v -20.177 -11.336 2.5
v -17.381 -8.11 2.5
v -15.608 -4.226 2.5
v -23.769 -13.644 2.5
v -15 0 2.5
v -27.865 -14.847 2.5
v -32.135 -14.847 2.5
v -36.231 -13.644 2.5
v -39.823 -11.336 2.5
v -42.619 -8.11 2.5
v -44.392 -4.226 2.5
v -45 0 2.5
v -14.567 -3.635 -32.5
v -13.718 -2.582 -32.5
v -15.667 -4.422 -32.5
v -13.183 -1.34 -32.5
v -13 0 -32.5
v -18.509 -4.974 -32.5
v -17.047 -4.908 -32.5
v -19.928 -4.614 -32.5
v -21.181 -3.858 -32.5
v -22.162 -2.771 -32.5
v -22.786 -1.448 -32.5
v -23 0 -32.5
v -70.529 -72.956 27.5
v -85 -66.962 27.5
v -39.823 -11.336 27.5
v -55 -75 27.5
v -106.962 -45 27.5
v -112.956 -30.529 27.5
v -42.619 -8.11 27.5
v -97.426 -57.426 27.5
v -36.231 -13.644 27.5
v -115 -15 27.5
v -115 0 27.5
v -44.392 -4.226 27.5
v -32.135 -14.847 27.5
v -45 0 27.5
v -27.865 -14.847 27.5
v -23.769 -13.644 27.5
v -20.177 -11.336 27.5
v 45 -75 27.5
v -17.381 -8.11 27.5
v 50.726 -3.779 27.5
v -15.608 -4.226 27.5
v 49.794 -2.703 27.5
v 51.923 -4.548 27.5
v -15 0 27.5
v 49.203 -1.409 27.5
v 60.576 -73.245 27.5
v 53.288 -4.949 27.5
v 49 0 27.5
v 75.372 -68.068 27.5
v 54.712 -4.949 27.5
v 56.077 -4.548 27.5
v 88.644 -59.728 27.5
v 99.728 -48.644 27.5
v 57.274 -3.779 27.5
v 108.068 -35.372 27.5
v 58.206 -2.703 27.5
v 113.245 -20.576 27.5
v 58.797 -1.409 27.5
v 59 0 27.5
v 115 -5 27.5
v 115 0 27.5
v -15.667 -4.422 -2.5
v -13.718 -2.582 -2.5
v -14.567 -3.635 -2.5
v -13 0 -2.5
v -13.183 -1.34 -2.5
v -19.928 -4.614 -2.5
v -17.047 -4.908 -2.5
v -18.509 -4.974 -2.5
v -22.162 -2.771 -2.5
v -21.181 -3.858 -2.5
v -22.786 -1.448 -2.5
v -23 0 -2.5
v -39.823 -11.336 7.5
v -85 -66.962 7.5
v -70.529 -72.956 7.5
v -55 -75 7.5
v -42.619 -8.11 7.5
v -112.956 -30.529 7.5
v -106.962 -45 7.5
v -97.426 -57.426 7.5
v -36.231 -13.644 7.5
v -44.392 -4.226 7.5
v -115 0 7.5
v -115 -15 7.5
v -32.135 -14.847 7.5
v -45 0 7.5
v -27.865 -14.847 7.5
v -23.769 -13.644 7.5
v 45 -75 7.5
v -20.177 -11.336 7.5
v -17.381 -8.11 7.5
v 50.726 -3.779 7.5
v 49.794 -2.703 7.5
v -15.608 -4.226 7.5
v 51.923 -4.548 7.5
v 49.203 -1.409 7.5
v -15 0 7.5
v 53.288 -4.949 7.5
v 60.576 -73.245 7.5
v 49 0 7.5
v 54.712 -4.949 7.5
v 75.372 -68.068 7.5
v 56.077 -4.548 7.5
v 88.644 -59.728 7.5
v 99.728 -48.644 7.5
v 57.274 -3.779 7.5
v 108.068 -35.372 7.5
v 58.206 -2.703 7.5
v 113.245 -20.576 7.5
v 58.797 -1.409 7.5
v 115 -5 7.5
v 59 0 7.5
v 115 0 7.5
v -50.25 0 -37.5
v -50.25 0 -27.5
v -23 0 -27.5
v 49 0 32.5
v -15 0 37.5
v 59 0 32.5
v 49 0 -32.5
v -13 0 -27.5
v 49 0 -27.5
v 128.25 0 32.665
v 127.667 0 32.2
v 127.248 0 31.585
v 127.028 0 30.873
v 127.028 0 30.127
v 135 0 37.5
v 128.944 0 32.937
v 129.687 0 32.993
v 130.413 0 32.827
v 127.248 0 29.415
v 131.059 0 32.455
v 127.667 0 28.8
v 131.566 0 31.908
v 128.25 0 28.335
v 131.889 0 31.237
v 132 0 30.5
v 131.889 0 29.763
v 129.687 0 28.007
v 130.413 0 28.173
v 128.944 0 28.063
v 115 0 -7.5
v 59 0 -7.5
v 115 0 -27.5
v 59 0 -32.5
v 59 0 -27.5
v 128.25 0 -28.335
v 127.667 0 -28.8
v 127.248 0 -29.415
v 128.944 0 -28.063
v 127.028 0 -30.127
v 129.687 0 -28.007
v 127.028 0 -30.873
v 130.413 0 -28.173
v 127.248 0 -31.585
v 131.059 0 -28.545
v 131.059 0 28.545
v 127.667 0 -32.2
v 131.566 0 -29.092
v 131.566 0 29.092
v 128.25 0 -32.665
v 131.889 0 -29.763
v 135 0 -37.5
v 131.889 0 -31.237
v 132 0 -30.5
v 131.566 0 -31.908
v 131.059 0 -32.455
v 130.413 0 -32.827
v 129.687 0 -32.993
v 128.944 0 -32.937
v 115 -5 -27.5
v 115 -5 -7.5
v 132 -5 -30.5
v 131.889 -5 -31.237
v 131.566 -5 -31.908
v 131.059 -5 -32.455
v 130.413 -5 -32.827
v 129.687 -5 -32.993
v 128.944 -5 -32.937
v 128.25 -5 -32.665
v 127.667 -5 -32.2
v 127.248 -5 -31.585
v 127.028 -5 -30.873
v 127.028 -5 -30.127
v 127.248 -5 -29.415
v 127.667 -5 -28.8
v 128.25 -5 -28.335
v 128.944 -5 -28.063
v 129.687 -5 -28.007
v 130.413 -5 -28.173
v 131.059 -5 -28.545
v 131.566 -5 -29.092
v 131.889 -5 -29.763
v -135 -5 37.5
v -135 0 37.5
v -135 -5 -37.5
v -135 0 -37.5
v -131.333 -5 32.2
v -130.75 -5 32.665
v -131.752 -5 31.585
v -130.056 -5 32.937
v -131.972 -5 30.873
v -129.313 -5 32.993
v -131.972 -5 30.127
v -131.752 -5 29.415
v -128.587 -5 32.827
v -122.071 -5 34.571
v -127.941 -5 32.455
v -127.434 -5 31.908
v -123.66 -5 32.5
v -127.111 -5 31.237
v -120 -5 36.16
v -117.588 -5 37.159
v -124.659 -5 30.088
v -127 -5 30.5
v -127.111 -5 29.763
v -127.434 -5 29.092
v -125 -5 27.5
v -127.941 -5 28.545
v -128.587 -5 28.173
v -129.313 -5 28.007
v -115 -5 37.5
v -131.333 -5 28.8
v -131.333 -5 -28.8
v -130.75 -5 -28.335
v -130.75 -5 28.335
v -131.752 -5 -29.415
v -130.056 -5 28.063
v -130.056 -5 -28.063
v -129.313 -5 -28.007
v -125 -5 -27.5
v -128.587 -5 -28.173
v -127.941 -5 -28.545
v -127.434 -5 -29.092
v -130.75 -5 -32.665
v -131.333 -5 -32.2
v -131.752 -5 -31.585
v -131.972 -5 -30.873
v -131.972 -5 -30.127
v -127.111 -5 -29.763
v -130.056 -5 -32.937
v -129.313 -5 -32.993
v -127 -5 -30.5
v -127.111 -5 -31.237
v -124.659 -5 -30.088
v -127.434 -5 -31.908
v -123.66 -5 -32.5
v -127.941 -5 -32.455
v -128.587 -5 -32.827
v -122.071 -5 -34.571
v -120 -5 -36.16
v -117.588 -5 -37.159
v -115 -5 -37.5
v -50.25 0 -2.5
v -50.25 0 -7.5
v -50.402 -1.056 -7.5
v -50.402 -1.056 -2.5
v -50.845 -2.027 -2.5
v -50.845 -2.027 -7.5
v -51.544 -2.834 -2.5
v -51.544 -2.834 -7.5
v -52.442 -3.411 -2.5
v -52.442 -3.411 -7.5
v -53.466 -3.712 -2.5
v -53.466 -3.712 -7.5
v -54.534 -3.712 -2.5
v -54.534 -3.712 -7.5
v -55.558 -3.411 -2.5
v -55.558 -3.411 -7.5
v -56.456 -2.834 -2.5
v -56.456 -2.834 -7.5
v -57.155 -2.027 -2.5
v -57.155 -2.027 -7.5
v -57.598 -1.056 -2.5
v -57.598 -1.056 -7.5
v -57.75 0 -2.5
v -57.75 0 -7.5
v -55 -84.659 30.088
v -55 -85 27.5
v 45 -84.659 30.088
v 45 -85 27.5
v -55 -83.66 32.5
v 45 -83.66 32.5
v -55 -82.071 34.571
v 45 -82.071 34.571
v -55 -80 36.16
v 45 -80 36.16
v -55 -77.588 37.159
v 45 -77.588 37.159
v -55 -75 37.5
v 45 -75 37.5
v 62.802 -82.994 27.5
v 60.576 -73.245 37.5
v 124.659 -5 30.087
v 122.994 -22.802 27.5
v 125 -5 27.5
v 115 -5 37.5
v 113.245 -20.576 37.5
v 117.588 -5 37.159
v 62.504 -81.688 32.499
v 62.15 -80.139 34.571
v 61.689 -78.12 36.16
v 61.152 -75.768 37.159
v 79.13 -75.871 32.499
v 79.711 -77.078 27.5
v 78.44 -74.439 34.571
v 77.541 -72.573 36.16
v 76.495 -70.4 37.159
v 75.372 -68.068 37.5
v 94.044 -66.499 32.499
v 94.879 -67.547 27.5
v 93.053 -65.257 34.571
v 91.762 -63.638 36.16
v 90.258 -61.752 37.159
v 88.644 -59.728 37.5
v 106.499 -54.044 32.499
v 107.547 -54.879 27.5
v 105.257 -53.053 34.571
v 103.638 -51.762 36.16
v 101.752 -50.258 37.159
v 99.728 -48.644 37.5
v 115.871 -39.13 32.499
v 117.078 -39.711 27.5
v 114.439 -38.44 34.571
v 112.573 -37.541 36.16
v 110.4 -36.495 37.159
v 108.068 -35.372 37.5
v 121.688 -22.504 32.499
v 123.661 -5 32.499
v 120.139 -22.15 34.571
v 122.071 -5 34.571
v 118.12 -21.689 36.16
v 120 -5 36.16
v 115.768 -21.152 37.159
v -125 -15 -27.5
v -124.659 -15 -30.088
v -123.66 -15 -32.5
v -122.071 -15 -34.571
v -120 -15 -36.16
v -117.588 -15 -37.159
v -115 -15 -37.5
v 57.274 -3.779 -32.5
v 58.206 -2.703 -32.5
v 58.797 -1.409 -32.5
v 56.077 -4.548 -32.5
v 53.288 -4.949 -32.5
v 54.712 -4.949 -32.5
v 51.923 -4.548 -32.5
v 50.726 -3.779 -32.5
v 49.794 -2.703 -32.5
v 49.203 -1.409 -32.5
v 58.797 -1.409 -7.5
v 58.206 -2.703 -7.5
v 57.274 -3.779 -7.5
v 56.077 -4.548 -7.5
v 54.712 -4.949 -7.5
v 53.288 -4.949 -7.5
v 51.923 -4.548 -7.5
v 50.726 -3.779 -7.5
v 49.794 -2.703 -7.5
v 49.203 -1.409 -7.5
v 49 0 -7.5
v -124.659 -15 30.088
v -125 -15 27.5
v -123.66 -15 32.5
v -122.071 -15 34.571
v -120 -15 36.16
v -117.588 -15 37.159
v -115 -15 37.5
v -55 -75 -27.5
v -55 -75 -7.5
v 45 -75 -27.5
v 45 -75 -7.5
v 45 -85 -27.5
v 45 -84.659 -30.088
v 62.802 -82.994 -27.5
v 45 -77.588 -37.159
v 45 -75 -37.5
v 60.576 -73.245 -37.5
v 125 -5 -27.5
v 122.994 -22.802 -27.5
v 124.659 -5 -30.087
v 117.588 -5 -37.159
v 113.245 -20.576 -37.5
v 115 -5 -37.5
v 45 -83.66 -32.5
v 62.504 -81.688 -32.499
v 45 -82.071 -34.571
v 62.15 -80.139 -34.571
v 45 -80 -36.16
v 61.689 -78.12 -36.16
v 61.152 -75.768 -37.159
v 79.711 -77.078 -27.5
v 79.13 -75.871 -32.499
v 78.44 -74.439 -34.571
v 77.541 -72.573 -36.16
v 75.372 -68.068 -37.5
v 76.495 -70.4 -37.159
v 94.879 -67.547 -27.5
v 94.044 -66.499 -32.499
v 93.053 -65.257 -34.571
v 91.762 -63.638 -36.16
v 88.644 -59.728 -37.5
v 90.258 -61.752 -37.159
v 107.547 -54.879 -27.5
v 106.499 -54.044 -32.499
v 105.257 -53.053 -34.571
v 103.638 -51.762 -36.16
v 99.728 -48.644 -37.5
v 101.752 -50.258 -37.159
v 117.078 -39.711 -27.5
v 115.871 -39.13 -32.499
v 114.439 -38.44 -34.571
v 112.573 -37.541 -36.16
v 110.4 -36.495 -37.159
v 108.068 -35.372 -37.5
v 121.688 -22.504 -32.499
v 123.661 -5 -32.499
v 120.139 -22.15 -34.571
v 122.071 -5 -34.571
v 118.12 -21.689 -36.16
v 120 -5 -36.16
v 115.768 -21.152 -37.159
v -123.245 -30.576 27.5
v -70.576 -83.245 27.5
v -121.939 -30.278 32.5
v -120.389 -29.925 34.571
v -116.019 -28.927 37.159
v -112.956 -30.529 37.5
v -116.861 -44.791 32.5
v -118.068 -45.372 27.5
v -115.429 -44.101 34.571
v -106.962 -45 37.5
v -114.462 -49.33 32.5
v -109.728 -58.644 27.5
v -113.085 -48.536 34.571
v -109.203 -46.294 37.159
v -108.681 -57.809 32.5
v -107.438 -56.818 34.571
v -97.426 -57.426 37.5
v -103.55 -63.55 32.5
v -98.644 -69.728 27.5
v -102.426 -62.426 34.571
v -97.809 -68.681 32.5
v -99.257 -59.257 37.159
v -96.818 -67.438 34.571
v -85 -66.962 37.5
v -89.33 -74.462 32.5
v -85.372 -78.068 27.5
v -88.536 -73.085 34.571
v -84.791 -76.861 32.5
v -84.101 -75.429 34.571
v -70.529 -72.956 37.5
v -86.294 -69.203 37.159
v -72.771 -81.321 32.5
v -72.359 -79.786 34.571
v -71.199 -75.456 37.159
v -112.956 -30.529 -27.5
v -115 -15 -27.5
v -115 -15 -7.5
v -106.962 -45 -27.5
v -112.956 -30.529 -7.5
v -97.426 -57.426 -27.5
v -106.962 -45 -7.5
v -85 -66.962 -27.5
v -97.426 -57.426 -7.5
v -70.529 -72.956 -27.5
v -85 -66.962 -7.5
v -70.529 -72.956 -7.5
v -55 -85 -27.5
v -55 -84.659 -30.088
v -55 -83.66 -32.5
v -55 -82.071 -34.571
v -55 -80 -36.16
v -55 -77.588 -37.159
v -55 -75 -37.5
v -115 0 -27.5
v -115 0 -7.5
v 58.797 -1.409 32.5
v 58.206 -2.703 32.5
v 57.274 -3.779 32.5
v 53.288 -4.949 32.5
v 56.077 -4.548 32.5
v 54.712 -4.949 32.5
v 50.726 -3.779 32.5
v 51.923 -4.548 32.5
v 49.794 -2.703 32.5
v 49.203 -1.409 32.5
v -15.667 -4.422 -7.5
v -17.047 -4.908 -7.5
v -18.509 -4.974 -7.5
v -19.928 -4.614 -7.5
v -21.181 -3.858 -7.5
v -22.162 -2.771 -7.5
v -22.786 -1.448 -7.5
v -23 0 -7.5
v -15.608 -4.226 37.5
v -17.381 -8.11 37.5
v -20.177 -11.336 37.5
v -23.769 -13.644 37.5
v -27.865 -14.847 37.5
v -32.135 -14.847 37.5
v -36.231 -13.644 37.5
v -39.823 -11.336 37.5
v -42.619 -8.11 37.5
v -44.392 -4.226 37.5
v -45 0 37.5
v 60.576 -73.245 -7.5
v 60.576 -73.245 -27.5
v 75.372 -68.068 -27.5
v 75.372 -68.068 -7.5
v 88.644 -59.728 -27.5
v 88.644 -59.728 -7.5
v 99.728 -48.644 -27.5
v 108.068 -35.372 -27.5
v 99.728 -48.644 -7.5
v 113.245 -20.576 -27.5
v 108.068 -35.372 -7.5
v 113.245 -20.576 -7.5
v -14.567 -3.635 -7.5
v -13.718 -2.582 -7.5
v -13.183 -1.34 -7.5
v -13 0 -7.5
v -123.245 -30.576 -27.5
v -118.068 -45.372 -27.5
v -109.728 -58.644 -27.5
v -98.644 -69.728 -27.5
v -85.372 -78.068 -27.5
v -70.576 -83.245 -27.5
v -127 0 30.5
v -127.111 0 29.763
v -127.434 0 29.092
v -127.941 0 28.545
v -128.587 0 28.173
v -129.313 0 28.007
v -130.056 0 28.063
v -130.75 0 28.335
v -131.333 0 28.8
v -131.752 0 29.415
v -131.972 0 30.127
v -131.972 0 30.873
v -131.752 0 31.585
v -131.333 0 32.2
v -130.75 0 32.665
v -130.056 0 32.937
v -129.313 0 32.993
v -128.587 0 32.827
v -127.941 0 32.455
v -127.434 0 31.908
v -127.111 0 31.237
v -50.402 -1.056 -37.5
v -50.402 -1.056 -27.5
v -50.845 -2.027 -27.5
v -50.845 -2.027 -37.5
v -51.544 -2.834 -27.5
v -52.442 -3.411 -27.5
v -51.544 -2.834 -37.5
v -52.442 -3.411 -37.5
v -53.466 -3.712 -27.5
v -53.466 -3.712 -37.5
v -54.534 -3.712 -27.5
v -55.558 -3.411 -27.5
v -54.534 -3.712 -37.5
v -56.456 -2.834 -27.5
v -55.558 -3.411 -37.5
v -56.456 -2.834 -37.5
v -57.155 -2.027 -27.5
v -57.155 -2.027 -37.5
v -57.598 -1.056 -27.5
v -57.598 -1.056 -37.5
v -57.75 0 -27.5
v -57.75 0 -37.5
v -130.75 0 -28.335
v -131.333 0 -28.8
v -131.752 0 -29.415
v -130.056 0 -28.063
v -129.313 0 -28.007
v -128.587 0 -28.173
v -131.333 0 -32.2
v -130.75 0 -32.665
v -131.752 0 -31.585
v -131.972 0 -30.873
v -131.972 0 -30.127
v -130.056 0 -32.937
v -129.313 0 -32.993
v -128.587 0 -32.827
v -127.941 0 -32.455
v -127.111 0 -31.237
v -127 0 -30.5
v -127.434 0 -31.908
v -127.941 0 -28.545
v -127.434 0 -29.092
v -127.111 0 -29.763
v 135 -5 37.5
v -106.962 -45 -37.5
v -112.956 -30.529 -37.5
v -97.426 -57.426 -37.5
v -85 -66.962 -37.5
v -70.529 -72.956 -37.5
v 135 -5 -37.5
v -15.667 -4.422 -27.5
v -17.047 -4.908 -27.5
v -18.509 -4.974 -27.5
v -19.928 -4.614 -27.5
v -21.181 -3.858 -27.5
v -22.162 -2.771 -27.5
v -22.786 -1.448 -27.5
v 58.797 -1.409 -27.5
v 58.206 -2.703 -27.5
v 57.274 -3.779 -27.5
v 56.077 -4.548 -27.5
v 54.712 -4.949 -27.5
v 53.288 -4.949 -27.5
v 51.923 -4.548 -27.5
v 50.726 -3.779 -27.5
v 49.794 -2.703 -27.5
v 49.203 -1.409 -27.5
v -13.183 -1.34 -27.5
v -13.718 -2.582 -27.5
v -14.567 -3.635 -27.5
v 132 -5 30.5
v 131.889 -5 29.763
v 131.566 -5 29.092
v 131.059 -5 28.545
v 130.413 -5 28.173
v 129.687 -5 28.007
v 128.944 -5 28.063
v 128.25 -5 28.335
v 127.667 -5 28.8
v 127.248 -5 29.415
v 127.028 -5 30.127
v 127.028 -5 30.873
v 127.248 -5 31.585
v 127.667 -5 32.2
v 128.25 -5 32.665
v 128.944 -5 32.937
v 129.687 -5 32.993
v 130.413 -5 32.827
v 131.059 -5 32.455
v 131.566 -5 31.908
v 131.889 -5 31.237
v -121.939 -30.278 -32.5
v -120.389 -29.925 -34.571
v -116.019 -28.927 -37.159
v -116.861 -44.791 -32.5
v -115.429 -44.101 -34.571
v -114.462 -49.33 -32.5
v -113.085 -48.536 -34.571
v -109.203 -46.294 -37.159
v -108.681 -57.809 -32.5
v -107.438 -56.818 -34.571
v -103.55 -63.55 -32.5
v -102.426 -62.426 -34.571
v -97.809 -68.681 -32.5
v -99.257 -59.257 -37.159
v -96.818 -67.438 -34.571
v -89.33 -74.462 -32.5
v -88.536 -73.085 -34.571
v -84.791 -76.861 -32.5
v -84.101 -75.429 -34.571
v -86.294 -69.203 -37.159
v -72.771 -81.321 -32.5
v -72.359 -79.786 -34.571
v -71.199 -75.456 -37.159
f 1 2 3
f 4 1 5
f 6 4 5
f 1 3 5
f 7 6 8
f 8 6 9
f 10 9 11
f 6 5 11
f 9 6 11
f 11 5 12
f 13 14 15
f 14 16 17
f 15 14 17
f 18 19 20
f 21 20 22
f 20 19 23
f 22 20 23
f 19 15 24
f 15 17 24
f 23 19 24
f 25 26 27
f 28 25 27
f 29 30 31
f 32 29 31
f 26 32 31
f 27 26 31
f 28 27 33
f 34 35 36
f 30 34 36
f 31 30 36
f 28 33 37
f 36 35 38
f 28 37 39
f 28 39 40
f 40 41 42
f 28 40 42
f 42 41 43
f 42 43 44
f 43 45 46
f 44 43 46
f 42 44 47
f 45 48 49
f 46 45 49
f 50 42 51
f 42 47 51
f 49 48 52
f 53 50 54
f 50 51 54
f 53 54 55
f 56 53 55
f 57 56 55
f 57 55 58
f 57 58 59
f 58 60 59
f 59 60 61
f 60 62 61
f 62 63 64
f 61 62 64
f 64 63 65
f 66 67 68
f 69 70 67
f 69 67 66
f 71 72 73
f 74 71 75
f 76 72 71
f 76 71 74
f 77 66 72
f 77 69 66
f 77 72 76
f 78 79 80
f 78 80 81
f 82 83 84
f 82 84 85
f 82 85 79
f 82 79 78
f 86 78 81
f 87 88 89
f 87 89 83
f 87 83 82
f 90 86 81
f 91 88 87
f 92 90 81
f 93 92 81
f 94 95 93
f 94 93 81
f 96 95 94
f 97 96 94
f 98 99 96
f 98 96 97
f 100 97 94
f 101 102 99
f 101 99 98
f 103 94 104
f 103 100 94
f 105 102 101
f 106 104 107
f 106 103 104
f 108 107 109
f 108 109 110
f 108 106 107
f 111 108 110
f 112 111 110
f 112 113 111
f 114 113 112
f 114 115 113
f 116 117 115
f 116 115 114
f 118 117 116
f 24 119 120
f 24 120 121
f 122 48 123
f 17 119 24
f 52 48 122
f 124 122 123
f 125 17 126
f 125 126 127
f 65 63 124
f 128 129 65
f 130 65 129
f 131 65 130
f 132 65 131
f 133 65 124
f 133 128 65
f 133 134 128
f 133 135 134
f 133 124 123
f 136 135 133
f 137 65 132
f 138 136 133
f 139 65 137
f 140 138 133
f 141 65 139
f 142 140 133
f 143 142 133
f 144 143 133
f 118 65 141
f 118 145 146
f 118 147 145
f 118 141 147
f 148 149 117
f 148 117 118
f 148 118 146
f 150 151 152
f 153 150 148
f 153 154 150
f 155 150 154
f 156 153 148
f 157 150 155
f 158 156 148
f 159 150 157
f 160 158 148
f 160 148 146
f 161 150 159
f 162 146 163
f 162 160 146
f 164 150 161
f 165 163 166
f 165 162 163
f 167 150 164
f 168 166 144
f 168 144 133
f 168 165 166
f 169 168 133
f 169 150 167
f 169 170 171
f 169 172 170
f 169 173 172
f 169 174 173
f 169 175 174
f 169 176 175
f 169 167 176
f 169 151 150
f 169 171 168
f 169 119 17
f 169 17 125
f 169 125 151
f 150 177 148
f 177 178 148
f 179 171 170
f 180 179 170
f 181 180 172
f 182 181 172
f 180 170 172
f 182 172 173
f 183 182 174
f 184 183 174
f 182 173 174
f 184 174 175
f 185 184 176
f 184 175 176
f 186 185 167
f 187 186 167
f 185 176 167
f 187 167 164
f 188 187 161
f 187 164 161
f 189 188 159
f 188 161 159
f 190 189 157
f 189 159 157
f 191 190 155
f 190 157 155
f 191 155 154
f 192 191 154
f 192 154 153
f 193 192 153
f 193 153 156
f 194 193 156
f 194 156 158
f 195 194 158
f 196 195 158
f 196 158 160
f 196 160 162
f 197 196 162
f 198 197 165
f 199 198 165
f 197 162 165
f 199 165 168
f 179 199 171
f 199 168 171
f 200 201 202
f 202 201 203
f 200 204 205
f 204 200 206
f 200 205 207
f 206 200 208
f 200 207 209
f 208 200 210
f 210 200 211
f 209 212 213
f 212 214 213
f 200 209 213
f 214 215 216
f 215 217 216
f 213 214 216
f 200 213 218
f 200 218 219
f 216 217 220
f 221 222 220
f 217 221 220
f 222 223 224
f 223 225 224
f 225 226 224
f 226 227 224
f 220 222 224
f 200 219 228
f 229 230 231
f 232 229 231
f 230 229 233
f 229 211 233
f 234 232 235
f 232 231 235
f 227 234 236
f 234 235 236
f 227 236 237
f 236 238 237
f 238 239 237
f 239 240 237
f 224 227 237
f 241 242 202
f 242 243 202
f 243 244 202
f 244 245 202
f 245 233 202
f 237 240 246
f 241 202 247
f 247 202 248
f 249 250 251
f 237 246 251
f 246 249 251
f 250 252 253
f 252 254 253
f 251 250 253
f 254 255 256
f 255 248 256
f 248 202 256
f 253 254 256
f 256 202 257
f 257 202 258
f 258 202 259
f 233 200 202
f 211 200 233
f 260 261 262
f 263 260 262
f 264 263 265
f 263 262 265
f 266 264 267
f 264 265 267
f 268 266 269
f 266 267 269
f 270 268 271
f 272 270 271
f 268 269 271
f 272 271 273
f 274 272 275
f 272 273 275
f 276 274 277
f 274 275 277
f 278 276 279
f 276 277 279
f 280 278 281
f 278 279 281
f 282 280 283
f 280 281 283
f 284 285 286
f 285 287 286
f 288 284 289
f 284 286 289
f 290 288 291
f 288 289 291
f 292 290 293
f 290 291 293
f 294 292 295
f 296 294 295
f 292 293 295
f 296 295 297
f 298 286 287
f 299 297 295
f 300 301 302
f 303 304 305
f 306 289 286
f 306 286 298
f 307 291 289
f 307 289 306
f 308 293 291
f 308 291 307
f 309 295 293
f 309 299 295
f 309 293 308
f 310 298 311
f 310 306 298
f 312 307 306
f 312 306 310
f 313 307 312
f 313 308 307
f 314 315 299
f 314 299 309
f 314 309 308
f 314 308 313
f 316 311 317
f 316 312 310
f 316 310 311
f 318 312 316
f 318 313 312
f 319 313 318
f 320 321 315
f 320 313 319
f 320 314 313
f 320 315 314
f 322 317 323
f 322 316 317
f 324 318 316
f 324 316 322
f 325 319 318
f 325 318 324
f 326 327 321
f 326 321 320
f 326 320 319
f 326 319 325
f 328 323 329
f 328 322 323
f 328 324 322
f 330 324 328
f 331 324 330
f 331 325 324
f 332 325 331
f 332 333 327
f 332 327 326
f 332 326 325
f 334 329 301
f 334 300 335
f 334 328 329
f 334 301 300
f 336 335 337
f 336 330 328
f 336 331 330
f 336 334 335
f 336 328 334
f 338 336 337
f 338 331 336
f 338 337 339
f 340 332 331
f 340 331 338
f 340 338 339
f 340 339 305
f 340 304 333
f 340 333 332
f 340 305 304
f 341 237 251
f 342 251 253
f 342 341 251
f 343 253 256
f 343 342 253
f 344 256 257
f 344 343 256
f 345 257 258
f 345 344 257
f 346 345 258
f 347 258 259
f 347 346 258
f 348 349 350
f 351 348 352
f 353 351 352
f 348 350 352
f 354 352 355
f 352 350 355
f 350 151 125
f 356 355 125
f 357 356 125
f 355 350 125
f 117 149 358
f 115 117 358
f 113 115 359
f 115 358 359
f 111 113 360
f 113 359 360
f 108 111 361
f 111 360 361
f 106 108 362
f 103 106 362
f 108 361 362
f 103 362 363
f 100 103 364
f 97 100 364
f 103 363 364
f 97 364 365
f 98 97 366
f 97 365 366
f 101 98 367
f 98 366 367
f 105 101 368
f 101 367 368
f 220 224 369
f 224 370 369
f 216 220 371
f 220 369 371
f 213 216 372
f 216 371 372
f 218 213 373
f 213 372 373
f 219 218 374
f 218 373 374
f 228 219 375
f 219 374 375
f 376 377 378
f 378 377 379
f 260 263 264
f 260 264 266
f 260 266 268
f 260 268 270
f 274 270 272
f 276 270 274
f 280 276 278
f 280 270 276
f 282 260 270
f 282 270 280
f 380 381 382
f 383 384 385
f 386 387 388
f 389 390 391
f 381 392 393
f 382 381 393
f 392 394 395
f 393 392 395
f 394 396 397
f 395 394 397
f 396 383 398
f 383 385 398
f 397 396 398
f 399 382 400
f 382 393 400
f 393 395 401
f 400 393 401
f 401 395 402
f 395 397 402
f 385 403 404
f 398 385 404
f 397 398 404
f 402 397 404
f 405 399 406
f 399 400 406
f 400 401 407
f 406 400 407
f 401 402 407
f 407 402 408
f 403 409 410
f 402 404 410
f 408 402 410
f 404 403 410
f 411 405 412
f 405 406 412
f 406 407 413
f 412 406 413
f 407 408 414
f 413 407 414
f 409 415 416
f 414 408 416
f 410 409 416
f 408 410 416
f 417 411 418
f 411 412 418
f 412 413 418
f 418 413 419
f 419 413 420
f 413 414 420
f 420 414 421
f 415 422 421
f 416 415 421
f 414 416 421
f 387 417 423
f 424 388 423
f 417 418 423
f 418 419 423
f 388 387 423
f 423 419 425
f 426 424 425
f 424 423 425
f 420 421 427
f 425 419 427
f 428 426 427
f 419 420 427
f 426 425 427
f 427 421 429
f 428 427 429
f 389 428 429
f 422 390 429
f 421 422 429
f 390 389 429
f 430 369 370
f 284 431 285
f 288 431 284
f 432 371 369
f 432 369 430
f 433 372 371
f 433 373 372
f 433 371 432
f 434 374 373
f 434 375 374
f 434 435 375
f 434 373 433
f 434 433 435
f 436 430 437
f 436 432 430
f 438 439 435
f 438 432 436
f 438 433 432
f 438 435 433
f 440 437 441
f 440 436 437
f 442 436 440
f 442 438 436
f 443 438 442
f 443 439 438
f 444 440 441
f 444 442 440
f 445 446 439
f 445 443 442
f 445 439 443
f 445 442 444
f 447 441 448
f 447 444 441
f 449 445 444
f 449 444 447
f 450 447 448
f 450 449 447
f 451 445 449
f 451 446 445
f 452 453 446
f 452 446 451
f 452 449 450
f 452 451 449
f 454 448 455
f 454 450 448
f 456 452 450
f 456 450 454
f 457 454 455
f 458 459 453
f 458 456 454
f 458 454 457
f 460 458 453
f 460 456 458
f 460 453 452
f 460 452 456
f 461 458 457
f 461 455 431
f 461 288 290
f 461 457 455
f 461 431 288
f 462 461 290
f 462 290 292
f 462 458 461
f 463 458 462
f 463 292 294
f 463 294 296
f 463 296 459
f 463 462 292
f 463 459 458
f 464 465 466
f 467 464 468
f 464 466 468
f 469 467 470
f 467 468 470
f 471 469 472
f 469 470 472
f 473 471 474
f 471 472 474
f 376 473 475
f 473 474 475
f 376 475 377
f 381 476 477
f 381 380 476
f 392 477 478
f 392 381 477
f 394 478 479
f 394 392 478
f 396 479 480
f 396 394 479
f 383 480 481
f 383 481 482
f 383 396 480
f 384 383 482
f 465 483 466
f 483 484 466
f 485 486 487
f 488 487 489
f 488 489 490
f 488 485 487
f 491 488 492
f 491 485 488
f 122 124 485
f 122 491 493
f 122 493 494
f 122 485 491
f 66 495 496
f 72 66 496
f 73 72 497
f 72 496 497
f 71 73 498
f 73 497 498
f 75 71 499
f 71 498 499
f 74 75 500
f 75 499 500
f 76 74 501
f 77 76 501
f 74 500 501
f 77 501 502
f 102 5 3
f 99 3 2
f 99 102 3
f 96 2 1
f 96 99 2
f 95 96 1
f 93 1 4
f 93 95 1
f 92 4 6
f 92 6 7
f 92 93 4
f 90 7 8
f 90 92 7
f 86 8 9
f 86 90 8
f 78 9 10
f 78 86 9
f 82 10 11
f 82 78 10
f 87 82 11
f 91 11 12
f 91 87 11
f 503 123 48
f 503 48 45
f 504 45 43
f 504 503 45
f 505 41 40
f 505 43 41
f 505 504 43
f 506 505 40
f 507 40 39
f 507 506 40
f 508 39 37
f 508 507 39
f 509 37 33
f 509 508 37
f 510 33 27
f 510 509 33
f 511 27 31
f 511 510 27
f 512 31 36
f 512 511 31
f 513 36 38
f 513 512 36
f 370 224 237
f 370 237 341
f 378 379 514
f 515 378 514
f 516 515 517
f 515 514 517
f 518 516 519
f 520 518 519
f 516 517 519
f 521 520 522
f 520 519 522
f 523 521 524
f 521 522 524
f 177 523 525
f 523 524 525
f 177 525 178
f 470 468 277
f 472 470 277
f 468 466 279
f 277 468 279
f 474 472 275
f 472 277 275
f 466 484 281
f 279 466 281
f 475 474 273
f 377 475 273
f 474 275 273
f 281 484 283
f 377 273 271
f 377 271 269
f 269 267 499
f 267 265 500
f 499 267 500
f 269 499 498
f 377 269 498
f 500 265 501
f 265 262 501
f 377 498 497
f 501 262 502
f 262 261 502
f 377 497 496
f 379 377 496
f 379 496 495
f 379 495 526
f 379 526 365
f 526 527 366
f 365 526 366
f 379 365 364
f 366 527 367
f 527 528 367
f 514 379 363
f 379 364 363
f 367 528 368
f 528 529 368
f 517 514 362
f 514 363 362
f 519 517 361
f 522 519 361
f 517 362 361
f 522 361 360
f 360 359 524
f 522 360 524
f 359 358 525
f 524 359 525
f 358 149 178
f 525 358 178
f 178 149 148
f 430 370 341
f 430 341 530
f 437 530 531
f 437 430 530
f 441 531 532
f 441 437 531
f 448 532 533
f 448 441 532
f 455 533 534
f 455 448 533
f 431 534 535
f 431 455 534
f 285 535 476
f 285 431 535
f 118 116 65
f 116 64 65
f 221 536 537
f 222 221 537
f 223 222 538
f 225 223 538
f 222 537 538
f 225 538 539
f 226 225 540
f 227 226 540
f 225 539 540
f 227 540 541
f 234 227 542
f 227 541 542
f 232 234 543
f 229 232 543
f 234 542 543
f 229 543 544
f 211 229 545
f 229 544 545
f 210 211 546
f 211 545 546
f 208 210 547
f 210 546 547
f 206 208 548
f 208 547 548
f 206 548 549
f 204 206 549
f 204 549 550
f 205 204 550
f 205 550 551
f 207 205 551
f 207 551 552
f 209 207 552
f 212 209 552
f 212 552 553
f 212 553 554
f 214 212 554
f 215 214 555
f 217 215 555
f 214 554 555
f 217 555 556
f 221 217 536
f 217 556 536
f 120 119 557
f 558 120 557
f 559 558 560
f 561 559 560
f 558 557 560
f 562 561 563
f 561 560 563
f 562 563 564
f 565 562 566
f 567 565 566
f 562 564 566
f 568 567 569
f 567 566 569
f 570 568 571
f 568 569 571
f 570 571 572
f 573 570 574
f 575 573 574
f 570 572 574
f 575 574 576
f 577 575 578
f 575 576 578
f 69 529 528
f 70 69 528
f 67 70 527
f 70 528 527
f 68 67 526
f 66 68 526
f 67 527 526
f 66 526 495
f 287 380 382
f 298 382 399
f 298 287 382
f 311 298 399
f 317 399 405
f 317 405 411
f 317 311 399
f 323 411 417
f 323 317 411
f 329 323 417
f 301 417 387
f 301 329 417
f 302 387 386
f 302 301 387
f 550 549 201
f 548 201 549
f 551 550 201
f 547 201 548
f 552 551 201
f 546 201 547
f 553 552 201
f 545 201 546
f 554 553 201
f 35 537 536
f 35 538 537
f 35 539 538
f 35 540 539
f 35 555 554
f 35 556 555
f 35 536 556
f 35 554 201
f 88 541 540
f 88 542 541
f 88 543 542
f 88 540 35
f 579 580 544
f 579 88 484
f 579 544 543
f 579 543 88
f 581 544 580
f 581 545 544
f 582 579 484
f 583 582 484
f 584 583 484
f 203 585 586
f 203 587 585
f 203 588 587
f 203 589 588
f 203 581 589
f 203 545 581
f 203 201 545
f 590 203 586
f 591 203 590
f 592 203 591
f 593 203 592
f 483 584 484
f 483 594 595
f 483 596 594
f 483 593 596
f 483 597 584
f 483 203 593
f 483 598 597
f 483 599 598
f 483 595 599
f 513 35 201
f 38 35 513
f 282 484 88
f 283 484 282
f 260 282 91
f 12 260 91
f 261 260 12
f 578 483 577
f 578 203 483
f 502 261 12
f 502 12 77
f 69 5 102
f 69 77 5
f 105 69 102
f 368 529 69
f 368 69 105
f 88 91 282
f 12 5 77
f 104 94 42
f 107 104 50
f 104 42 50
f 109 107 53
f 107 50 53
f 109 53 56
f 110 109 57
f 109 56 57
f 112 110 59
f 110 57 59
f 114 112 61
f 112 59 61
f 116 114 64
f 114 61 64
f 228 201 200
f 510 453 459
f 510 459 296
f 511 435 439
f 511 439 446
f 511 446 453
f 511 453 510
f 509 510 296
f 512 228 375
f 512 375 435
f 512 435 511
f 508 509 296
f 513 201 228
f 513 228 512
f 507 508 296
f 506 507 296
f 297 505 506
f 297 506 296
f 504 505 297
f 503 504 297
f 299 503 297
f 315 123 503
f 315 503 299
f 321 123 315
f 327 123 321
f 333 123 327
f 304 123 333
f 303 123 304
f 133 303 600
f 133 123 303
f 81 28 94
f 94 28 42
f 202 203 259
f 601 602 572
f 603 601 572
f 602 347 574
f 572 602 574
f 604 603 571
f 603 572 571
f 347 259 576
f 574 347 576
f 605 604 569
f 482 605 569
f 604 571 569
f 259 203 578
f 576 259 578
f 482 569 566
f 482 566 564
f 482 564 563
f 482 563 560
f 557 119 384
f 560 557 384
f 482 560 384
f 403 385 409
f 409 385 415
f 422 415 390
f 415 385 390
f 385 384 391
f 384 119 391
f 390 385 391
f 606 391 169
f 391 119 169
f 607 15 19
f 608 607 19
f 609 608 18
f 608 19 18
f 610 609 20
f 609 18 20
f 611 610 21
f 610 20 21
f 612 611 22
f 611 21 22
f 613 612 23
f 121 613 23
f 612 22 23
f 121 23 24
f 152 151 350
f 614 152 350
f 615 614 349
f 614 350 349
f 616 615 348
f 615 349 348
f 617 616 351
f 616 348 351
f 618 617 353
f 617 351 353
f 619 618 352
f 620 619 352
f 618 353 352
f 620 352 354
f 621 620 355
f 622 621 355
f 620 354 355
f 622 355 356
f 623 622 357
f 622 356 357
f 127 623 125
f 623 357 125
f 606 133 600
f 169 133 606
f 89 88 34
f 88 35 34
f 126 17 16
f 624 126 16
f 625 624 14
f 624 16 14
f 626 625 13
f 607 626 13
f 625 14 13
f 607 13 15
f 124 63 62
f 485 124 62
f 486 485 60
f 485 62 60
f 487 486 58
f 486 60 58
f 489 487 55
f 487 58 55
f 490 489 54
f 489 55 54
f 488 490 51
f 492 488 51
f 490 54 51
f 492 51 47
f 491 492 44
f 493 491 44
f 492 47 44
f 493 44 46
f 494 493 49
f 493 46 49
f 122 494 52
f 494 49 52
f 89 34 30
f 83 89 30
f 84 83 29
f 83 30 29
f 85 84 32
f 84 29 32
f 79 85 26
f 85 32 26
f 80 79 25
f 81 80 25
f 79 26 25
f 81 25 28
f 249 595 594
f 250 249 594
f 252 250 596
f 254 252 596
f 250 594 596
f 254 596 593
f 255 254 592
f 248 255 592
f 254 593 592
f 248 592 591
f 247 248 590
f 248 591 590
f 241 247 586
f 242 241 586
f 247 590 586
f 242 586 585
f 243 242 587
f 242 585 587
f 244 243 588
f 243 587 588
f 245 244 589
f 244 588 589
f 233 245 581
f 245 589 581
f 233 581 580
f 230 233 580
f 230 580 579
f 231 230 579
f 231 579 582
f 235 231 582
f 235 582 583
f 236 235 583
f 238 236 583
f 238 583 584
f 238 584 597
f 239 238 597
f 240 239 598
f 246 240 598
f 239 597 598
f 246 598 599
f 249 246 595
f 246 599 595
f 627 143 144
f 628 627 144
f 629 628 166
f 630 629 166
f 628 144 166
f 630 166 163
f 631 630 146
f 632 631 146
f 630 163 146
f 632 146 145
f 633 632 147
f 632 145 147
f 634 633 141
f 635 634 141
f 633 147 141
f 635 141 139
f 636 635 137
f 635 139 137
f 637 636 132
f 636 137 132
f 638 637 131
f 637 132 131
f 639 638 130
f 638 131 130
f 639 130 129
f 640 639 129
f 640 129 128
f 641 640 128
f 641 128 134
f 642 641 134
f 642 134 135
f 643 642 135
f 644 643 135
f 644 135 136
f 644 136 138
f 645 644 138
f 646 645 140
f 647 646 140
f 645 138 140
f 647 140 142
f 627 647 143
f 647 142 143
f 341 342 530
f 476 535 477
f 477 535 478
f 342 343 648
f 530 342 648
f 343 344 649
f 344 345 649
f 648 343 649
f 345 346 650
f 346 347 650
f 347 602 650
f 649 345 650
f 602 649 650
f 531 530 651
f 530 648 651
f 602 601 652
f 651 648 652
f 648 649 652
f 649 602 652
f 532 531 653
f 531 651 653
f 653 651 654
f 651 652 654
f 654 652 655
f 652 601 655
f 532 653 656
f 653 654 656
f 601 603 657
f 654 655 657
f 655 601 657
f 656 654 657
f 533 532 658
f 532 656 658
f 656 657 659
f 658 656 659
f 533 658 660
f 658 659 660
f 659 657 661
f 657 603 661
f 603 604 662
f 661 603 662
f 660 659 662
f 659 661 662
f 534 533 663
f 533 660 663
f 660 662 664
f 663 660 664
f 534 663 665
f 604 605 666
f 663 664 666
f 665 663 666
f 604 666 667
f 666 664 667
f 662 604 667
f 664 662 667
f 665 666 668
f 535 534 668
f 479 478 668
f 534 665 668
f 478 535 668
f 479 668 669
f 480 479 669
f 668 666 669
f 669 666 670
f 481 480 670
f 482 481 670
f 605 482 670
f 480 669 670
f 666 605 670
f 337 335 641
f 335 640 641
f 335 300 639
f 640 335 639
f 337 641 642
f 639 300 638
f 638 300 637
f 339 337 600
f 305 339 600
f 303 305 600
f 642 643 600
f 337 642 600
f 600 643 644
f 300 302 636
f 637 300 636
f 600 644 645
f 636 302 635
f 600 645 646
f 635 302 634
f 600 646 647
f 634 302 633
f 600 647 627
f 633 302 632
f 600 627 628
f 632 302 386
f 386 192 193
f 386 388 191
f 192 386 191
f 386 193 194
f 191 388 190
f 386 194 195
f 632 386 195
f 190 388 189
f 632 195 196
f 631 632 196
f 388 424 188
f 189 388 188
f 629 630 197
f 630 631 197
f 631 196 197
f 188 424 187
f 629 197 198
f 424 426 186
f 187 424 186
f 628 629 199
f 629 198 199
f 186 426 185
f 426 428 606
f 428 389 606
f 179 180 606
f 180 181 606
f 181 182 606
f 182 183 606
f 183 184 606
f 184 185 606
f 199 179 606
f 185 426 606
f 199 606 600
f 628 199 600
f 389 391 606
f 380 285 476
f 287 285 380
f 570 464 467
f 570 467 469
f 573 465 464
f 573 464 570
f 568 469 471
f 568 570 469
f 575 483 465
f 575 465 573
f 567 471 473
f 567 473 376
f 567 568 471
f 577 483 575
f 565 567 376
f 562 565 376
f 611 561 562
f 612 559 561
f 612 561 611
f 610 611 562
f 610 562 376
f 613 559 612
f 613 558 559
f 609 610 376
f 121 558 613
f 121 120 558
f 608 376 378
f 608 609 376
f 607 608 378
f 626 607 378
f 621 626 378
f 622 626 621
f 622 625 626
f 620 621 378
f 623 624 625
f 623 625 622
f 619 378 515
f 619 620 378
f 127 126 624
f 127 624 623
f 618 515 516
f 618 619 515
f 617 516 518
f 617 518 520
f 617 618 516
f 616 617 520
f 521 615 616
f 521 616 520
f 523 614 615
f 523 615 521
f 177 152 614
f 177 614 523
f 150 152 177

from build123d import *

# Parameters (mm, degrees)
BOSS_EXTRUDE1_DEPTH     = 37.5
SHELL1_T                = -10
SKETCH2_W               = 230
SKETCH2_H               = 15
BOSS_EXTRUDE3_DEPTH     = 75
SKETCH1_4_OUTSIDE_W     = 306.9
SKETCH1_4_OUTSIDE_H     = 141.9
CUT_EXTRUDE2_DEPTH      = 38.5
CUT_EXTRUDE2_DEPTH_BACK = 38.5
SKETCH4_W               = 10
SKETCH4_H               = 75
SKETCH4_R               = 2.5
BOSS_EXTRUDE4_DEPTH     = 5
FILLET1_R               = 10
SKETCH3_R               = 3.75
CUT_EXTRUDE3_DEPTH      = 35
CUT_EXTRUDE4_START      = -75
SKETCH3_13_R            = 15
CUT_EXTRUDE4_DEPTH      = 35
CUT_EXTRUDE5_START      = -5
CUT_EXTRUDE5_DEPTH      = 65
CUT_EXTRUDE6_START      = -5
CUT_EXTRUDE6_DEPTH      = 30


with BuildPart() as part:
    # Sketch1 → Boss-Extrude1 (new body, symmetric)
    with BuildSketch(Plane.XY):
        with BuildLine():
            Line((125, 0), (-125, 0))
            Line((-125, 0), (-125, -15))
            ThreePointArc((-125, -15), (-104.497474683, -64.497474683), (-55, -85))
            Line((-55, -85), (45, -85))
            ThreePointArc((45, -85), (101.568542495, -61.568542495), (125, -5))
            Line((125, -5), (125, 0))
        make_face()
    extrude(amount=BOSS_EXTRUDE1_DEPTH, both=True)

    # Shell1
    shell1_openings = [part.faces().sort_by_distance(p)[0] for p in [
        (0, 0, 0),
    ]]
    offset(amount=SHELL1_T, openings=shell1_openings, kind=Kind.INTERSECTION)

    # Sketch2 → Boss-Extrude3 (add)
    with BuildSketch(Plane(origin=(0, 0, 0), x_dir=(1, 0, 0), z_dir=(0, 1, 0))):
        Rectangle(SKETCH2_W, SKETCH2_H)
    extrude(amount=-BOSS_EXTRUDE3_DEPTH)

    # Sketch1<4> outside → Cut-Extrude2 (cut, two sides)
    with BuildSketch(Plane.XY) as cut_extrude2_sk:
        with Locations((0, -42.5)):
            Rectangle(SKETCH1_4_OUTSIDE_W, SKETCH1_4_OUTSIDE_H)
        with BuildLine():
            Line((125, 0), (-125, 0))
            Line((-125, 0), (-125, -15))
            ThreePointArc((-125, -15), (-104.497474683, -64.497474683), (-55, -85))
            Line((-55, -85), (45, -85))
            ThreePointArc((45, -85), (101.568542495, -61.568542495), (125, -5))
            Line((125, -5), (125, 0))
        make_face(mode=Mode.SUBTRACT)
    extrude(amount=CUT_EXTRUDE2_DEPTH, mode=Mode.SUBTRACT)
    extrude(cut_extrude2_sk.sketch, amount=-CUT_EXTRUDE2_DEPTH_BACK, mode=Mode.SUBTRACT)

    # Sketch4 → Boss-Extrude4 (add)
    with BuildSketch(Plane(origin=(0, 0, 0), x_dir=(1, 0, 0), z_dir=(0, 1, 0))):
        with Locations((-130, 0)):
            Rectangle(SKETCH4_W, SKETCH4_H)
        with Locations((-129.5, -30.5)):
            Circle(SKETCH4_R, mode=Mode.SUBTRACT)
        with Locations((-129.5, 30.5)):
            Circle(SKETCH4_R, mode=Mode.SUBTRACT)
        with Locations((130, 0)):
            Rectangle(SKETCH4_W, SKETCH4_H)
        with Locations((129.5, 30.5)):
            Circle(SKETCH4_R, mode=Mode.SUBTRACT)
        with Locations((129.5, -30.5)):
            Circle(SKETCH4_R, mode=Mode.SUBTRACT)
    extrude(amount=-BOSS_EXTRUDE4_DEPTH)

    # Fillet1
    fillet1_edges = [part.edges().sort_by_distance(p)[0] for p in [
        (-125, -10, -37.5),
        (-125, -10, 37.5),
        (-5, -85, 37.5),
        (-104.497474683, -64.497474683, 37.5),
        (-104.497474683, -64.497474683, -37.5),
        (-5, -85, -37.5),
        (101.568542495, -61.568542495, -37.5),
        (101.568542495, -61.568542495, 37.5),
    ]]
    fillet(fillet1_edges, radius=FILLET1_R)

    # Sketch3 → Cut-Extrude3 (cut)
    with BuildSketch(Plane(origin=(0, 0, -37.5), x_dir=(-1, 0, 0), z_dir=(0, 0, -1))):
        with Locations((54, 0)):
            Circle(SKETCH3_R)
    extrude(amount=-CUT_EXTRUDE3_DEPTH, mode=Mode.SUBTRACT)

    # Sketch3<13> → Cut-Extrude4 (cut)
    with BuildSketch(Plane(origin=(0, 0, -37.5), x_dir=(-1, 0, 0), z_dir=(0, 0, -1)).offset(CUT_EXTRUDE4_START)):
        with Locations((30, 0)):
            Circle(SKETCH3_13_R)
    extrude(amount=CUT_EXTRUDE4_DEPTH, mode=Mode.SUBTRACT)

    # Sketch3<14> → Cut-Extrude5 (cut)
    with BuildSketch(Plane(origin=(0, 0, -37.5), x_dir=(-1, 0, 0), z_dir=(0, 0, -1)).offset(CUT_EXTRUDE5_START)):
        with BuildLine():
            Line((-59, 0), (-49, 0))
            ThreePointArc((-49, 0), (-54, 5), (-59, 0))
        make_face()
        with BuildLine():
            ThreePointArc((-59, 0), (-54, -5), (-49, 0))
            Line((-49, 0), (-59, 0))
        make_face()
    extrude(amount=-CUT_EXTRUDE5_DEPTH, mode=Mode.SUBTRACT)

    # Sketch3<15> → Cut-Extrude6 (cut)
    with BuildSketch(Plane(origin=(0, 0, -37.5), x_dir=(-1, 0, 0), z_dir=(0, 0, -1)).offset(CUT_EXTRUDE6_START)):
        with BuildLine():
            Line((15, 0), (23, 0))
            ThreePointArc((23, 0), (20.581988897, 4.281744193), (15.666666667, 4.422166387))
            ThreePointArc((15.666666667, 4.422166387), (15.167603026, 2.236067977), (15, 0))
        make_face()
        with BuildLine():
            ThreePointArc((15.666666667, -4.422166387), (20.581988897, -4.281744193), (23, 0))
            Line((23, 0), (15, 0))
            ThreePointArc((15, 0), (15.167603026, -2.236067977), (15.666666667, -4.422166387))
        make_face()
        with BuildLine():
            ThreePointArc((15, 0), (15.167603026, 2.236067977), (15.666666667, 4.422166387))
            ThreePointArc((15.666666667, 4.422166387), (13.718255807, 2.581988897), (13, 0))
            Line((13, 0), (15, 0))
        make_face()
        with BuildLine():
            ThreePointArc((13, 0), (13.718255807, -2.581988897), (15.666666667, -4.422166387))
            ThreePointArc((15.666666667, -4.422166387), (15.167603026, -2.236067977), (15, 0))
            Line((15, 0), (13, 0))
        make_face()
    extrude(amount=-CUT_EXTRUDE6_DEPTH, mode=Mode.SUBTRACT)


solid = part.part
